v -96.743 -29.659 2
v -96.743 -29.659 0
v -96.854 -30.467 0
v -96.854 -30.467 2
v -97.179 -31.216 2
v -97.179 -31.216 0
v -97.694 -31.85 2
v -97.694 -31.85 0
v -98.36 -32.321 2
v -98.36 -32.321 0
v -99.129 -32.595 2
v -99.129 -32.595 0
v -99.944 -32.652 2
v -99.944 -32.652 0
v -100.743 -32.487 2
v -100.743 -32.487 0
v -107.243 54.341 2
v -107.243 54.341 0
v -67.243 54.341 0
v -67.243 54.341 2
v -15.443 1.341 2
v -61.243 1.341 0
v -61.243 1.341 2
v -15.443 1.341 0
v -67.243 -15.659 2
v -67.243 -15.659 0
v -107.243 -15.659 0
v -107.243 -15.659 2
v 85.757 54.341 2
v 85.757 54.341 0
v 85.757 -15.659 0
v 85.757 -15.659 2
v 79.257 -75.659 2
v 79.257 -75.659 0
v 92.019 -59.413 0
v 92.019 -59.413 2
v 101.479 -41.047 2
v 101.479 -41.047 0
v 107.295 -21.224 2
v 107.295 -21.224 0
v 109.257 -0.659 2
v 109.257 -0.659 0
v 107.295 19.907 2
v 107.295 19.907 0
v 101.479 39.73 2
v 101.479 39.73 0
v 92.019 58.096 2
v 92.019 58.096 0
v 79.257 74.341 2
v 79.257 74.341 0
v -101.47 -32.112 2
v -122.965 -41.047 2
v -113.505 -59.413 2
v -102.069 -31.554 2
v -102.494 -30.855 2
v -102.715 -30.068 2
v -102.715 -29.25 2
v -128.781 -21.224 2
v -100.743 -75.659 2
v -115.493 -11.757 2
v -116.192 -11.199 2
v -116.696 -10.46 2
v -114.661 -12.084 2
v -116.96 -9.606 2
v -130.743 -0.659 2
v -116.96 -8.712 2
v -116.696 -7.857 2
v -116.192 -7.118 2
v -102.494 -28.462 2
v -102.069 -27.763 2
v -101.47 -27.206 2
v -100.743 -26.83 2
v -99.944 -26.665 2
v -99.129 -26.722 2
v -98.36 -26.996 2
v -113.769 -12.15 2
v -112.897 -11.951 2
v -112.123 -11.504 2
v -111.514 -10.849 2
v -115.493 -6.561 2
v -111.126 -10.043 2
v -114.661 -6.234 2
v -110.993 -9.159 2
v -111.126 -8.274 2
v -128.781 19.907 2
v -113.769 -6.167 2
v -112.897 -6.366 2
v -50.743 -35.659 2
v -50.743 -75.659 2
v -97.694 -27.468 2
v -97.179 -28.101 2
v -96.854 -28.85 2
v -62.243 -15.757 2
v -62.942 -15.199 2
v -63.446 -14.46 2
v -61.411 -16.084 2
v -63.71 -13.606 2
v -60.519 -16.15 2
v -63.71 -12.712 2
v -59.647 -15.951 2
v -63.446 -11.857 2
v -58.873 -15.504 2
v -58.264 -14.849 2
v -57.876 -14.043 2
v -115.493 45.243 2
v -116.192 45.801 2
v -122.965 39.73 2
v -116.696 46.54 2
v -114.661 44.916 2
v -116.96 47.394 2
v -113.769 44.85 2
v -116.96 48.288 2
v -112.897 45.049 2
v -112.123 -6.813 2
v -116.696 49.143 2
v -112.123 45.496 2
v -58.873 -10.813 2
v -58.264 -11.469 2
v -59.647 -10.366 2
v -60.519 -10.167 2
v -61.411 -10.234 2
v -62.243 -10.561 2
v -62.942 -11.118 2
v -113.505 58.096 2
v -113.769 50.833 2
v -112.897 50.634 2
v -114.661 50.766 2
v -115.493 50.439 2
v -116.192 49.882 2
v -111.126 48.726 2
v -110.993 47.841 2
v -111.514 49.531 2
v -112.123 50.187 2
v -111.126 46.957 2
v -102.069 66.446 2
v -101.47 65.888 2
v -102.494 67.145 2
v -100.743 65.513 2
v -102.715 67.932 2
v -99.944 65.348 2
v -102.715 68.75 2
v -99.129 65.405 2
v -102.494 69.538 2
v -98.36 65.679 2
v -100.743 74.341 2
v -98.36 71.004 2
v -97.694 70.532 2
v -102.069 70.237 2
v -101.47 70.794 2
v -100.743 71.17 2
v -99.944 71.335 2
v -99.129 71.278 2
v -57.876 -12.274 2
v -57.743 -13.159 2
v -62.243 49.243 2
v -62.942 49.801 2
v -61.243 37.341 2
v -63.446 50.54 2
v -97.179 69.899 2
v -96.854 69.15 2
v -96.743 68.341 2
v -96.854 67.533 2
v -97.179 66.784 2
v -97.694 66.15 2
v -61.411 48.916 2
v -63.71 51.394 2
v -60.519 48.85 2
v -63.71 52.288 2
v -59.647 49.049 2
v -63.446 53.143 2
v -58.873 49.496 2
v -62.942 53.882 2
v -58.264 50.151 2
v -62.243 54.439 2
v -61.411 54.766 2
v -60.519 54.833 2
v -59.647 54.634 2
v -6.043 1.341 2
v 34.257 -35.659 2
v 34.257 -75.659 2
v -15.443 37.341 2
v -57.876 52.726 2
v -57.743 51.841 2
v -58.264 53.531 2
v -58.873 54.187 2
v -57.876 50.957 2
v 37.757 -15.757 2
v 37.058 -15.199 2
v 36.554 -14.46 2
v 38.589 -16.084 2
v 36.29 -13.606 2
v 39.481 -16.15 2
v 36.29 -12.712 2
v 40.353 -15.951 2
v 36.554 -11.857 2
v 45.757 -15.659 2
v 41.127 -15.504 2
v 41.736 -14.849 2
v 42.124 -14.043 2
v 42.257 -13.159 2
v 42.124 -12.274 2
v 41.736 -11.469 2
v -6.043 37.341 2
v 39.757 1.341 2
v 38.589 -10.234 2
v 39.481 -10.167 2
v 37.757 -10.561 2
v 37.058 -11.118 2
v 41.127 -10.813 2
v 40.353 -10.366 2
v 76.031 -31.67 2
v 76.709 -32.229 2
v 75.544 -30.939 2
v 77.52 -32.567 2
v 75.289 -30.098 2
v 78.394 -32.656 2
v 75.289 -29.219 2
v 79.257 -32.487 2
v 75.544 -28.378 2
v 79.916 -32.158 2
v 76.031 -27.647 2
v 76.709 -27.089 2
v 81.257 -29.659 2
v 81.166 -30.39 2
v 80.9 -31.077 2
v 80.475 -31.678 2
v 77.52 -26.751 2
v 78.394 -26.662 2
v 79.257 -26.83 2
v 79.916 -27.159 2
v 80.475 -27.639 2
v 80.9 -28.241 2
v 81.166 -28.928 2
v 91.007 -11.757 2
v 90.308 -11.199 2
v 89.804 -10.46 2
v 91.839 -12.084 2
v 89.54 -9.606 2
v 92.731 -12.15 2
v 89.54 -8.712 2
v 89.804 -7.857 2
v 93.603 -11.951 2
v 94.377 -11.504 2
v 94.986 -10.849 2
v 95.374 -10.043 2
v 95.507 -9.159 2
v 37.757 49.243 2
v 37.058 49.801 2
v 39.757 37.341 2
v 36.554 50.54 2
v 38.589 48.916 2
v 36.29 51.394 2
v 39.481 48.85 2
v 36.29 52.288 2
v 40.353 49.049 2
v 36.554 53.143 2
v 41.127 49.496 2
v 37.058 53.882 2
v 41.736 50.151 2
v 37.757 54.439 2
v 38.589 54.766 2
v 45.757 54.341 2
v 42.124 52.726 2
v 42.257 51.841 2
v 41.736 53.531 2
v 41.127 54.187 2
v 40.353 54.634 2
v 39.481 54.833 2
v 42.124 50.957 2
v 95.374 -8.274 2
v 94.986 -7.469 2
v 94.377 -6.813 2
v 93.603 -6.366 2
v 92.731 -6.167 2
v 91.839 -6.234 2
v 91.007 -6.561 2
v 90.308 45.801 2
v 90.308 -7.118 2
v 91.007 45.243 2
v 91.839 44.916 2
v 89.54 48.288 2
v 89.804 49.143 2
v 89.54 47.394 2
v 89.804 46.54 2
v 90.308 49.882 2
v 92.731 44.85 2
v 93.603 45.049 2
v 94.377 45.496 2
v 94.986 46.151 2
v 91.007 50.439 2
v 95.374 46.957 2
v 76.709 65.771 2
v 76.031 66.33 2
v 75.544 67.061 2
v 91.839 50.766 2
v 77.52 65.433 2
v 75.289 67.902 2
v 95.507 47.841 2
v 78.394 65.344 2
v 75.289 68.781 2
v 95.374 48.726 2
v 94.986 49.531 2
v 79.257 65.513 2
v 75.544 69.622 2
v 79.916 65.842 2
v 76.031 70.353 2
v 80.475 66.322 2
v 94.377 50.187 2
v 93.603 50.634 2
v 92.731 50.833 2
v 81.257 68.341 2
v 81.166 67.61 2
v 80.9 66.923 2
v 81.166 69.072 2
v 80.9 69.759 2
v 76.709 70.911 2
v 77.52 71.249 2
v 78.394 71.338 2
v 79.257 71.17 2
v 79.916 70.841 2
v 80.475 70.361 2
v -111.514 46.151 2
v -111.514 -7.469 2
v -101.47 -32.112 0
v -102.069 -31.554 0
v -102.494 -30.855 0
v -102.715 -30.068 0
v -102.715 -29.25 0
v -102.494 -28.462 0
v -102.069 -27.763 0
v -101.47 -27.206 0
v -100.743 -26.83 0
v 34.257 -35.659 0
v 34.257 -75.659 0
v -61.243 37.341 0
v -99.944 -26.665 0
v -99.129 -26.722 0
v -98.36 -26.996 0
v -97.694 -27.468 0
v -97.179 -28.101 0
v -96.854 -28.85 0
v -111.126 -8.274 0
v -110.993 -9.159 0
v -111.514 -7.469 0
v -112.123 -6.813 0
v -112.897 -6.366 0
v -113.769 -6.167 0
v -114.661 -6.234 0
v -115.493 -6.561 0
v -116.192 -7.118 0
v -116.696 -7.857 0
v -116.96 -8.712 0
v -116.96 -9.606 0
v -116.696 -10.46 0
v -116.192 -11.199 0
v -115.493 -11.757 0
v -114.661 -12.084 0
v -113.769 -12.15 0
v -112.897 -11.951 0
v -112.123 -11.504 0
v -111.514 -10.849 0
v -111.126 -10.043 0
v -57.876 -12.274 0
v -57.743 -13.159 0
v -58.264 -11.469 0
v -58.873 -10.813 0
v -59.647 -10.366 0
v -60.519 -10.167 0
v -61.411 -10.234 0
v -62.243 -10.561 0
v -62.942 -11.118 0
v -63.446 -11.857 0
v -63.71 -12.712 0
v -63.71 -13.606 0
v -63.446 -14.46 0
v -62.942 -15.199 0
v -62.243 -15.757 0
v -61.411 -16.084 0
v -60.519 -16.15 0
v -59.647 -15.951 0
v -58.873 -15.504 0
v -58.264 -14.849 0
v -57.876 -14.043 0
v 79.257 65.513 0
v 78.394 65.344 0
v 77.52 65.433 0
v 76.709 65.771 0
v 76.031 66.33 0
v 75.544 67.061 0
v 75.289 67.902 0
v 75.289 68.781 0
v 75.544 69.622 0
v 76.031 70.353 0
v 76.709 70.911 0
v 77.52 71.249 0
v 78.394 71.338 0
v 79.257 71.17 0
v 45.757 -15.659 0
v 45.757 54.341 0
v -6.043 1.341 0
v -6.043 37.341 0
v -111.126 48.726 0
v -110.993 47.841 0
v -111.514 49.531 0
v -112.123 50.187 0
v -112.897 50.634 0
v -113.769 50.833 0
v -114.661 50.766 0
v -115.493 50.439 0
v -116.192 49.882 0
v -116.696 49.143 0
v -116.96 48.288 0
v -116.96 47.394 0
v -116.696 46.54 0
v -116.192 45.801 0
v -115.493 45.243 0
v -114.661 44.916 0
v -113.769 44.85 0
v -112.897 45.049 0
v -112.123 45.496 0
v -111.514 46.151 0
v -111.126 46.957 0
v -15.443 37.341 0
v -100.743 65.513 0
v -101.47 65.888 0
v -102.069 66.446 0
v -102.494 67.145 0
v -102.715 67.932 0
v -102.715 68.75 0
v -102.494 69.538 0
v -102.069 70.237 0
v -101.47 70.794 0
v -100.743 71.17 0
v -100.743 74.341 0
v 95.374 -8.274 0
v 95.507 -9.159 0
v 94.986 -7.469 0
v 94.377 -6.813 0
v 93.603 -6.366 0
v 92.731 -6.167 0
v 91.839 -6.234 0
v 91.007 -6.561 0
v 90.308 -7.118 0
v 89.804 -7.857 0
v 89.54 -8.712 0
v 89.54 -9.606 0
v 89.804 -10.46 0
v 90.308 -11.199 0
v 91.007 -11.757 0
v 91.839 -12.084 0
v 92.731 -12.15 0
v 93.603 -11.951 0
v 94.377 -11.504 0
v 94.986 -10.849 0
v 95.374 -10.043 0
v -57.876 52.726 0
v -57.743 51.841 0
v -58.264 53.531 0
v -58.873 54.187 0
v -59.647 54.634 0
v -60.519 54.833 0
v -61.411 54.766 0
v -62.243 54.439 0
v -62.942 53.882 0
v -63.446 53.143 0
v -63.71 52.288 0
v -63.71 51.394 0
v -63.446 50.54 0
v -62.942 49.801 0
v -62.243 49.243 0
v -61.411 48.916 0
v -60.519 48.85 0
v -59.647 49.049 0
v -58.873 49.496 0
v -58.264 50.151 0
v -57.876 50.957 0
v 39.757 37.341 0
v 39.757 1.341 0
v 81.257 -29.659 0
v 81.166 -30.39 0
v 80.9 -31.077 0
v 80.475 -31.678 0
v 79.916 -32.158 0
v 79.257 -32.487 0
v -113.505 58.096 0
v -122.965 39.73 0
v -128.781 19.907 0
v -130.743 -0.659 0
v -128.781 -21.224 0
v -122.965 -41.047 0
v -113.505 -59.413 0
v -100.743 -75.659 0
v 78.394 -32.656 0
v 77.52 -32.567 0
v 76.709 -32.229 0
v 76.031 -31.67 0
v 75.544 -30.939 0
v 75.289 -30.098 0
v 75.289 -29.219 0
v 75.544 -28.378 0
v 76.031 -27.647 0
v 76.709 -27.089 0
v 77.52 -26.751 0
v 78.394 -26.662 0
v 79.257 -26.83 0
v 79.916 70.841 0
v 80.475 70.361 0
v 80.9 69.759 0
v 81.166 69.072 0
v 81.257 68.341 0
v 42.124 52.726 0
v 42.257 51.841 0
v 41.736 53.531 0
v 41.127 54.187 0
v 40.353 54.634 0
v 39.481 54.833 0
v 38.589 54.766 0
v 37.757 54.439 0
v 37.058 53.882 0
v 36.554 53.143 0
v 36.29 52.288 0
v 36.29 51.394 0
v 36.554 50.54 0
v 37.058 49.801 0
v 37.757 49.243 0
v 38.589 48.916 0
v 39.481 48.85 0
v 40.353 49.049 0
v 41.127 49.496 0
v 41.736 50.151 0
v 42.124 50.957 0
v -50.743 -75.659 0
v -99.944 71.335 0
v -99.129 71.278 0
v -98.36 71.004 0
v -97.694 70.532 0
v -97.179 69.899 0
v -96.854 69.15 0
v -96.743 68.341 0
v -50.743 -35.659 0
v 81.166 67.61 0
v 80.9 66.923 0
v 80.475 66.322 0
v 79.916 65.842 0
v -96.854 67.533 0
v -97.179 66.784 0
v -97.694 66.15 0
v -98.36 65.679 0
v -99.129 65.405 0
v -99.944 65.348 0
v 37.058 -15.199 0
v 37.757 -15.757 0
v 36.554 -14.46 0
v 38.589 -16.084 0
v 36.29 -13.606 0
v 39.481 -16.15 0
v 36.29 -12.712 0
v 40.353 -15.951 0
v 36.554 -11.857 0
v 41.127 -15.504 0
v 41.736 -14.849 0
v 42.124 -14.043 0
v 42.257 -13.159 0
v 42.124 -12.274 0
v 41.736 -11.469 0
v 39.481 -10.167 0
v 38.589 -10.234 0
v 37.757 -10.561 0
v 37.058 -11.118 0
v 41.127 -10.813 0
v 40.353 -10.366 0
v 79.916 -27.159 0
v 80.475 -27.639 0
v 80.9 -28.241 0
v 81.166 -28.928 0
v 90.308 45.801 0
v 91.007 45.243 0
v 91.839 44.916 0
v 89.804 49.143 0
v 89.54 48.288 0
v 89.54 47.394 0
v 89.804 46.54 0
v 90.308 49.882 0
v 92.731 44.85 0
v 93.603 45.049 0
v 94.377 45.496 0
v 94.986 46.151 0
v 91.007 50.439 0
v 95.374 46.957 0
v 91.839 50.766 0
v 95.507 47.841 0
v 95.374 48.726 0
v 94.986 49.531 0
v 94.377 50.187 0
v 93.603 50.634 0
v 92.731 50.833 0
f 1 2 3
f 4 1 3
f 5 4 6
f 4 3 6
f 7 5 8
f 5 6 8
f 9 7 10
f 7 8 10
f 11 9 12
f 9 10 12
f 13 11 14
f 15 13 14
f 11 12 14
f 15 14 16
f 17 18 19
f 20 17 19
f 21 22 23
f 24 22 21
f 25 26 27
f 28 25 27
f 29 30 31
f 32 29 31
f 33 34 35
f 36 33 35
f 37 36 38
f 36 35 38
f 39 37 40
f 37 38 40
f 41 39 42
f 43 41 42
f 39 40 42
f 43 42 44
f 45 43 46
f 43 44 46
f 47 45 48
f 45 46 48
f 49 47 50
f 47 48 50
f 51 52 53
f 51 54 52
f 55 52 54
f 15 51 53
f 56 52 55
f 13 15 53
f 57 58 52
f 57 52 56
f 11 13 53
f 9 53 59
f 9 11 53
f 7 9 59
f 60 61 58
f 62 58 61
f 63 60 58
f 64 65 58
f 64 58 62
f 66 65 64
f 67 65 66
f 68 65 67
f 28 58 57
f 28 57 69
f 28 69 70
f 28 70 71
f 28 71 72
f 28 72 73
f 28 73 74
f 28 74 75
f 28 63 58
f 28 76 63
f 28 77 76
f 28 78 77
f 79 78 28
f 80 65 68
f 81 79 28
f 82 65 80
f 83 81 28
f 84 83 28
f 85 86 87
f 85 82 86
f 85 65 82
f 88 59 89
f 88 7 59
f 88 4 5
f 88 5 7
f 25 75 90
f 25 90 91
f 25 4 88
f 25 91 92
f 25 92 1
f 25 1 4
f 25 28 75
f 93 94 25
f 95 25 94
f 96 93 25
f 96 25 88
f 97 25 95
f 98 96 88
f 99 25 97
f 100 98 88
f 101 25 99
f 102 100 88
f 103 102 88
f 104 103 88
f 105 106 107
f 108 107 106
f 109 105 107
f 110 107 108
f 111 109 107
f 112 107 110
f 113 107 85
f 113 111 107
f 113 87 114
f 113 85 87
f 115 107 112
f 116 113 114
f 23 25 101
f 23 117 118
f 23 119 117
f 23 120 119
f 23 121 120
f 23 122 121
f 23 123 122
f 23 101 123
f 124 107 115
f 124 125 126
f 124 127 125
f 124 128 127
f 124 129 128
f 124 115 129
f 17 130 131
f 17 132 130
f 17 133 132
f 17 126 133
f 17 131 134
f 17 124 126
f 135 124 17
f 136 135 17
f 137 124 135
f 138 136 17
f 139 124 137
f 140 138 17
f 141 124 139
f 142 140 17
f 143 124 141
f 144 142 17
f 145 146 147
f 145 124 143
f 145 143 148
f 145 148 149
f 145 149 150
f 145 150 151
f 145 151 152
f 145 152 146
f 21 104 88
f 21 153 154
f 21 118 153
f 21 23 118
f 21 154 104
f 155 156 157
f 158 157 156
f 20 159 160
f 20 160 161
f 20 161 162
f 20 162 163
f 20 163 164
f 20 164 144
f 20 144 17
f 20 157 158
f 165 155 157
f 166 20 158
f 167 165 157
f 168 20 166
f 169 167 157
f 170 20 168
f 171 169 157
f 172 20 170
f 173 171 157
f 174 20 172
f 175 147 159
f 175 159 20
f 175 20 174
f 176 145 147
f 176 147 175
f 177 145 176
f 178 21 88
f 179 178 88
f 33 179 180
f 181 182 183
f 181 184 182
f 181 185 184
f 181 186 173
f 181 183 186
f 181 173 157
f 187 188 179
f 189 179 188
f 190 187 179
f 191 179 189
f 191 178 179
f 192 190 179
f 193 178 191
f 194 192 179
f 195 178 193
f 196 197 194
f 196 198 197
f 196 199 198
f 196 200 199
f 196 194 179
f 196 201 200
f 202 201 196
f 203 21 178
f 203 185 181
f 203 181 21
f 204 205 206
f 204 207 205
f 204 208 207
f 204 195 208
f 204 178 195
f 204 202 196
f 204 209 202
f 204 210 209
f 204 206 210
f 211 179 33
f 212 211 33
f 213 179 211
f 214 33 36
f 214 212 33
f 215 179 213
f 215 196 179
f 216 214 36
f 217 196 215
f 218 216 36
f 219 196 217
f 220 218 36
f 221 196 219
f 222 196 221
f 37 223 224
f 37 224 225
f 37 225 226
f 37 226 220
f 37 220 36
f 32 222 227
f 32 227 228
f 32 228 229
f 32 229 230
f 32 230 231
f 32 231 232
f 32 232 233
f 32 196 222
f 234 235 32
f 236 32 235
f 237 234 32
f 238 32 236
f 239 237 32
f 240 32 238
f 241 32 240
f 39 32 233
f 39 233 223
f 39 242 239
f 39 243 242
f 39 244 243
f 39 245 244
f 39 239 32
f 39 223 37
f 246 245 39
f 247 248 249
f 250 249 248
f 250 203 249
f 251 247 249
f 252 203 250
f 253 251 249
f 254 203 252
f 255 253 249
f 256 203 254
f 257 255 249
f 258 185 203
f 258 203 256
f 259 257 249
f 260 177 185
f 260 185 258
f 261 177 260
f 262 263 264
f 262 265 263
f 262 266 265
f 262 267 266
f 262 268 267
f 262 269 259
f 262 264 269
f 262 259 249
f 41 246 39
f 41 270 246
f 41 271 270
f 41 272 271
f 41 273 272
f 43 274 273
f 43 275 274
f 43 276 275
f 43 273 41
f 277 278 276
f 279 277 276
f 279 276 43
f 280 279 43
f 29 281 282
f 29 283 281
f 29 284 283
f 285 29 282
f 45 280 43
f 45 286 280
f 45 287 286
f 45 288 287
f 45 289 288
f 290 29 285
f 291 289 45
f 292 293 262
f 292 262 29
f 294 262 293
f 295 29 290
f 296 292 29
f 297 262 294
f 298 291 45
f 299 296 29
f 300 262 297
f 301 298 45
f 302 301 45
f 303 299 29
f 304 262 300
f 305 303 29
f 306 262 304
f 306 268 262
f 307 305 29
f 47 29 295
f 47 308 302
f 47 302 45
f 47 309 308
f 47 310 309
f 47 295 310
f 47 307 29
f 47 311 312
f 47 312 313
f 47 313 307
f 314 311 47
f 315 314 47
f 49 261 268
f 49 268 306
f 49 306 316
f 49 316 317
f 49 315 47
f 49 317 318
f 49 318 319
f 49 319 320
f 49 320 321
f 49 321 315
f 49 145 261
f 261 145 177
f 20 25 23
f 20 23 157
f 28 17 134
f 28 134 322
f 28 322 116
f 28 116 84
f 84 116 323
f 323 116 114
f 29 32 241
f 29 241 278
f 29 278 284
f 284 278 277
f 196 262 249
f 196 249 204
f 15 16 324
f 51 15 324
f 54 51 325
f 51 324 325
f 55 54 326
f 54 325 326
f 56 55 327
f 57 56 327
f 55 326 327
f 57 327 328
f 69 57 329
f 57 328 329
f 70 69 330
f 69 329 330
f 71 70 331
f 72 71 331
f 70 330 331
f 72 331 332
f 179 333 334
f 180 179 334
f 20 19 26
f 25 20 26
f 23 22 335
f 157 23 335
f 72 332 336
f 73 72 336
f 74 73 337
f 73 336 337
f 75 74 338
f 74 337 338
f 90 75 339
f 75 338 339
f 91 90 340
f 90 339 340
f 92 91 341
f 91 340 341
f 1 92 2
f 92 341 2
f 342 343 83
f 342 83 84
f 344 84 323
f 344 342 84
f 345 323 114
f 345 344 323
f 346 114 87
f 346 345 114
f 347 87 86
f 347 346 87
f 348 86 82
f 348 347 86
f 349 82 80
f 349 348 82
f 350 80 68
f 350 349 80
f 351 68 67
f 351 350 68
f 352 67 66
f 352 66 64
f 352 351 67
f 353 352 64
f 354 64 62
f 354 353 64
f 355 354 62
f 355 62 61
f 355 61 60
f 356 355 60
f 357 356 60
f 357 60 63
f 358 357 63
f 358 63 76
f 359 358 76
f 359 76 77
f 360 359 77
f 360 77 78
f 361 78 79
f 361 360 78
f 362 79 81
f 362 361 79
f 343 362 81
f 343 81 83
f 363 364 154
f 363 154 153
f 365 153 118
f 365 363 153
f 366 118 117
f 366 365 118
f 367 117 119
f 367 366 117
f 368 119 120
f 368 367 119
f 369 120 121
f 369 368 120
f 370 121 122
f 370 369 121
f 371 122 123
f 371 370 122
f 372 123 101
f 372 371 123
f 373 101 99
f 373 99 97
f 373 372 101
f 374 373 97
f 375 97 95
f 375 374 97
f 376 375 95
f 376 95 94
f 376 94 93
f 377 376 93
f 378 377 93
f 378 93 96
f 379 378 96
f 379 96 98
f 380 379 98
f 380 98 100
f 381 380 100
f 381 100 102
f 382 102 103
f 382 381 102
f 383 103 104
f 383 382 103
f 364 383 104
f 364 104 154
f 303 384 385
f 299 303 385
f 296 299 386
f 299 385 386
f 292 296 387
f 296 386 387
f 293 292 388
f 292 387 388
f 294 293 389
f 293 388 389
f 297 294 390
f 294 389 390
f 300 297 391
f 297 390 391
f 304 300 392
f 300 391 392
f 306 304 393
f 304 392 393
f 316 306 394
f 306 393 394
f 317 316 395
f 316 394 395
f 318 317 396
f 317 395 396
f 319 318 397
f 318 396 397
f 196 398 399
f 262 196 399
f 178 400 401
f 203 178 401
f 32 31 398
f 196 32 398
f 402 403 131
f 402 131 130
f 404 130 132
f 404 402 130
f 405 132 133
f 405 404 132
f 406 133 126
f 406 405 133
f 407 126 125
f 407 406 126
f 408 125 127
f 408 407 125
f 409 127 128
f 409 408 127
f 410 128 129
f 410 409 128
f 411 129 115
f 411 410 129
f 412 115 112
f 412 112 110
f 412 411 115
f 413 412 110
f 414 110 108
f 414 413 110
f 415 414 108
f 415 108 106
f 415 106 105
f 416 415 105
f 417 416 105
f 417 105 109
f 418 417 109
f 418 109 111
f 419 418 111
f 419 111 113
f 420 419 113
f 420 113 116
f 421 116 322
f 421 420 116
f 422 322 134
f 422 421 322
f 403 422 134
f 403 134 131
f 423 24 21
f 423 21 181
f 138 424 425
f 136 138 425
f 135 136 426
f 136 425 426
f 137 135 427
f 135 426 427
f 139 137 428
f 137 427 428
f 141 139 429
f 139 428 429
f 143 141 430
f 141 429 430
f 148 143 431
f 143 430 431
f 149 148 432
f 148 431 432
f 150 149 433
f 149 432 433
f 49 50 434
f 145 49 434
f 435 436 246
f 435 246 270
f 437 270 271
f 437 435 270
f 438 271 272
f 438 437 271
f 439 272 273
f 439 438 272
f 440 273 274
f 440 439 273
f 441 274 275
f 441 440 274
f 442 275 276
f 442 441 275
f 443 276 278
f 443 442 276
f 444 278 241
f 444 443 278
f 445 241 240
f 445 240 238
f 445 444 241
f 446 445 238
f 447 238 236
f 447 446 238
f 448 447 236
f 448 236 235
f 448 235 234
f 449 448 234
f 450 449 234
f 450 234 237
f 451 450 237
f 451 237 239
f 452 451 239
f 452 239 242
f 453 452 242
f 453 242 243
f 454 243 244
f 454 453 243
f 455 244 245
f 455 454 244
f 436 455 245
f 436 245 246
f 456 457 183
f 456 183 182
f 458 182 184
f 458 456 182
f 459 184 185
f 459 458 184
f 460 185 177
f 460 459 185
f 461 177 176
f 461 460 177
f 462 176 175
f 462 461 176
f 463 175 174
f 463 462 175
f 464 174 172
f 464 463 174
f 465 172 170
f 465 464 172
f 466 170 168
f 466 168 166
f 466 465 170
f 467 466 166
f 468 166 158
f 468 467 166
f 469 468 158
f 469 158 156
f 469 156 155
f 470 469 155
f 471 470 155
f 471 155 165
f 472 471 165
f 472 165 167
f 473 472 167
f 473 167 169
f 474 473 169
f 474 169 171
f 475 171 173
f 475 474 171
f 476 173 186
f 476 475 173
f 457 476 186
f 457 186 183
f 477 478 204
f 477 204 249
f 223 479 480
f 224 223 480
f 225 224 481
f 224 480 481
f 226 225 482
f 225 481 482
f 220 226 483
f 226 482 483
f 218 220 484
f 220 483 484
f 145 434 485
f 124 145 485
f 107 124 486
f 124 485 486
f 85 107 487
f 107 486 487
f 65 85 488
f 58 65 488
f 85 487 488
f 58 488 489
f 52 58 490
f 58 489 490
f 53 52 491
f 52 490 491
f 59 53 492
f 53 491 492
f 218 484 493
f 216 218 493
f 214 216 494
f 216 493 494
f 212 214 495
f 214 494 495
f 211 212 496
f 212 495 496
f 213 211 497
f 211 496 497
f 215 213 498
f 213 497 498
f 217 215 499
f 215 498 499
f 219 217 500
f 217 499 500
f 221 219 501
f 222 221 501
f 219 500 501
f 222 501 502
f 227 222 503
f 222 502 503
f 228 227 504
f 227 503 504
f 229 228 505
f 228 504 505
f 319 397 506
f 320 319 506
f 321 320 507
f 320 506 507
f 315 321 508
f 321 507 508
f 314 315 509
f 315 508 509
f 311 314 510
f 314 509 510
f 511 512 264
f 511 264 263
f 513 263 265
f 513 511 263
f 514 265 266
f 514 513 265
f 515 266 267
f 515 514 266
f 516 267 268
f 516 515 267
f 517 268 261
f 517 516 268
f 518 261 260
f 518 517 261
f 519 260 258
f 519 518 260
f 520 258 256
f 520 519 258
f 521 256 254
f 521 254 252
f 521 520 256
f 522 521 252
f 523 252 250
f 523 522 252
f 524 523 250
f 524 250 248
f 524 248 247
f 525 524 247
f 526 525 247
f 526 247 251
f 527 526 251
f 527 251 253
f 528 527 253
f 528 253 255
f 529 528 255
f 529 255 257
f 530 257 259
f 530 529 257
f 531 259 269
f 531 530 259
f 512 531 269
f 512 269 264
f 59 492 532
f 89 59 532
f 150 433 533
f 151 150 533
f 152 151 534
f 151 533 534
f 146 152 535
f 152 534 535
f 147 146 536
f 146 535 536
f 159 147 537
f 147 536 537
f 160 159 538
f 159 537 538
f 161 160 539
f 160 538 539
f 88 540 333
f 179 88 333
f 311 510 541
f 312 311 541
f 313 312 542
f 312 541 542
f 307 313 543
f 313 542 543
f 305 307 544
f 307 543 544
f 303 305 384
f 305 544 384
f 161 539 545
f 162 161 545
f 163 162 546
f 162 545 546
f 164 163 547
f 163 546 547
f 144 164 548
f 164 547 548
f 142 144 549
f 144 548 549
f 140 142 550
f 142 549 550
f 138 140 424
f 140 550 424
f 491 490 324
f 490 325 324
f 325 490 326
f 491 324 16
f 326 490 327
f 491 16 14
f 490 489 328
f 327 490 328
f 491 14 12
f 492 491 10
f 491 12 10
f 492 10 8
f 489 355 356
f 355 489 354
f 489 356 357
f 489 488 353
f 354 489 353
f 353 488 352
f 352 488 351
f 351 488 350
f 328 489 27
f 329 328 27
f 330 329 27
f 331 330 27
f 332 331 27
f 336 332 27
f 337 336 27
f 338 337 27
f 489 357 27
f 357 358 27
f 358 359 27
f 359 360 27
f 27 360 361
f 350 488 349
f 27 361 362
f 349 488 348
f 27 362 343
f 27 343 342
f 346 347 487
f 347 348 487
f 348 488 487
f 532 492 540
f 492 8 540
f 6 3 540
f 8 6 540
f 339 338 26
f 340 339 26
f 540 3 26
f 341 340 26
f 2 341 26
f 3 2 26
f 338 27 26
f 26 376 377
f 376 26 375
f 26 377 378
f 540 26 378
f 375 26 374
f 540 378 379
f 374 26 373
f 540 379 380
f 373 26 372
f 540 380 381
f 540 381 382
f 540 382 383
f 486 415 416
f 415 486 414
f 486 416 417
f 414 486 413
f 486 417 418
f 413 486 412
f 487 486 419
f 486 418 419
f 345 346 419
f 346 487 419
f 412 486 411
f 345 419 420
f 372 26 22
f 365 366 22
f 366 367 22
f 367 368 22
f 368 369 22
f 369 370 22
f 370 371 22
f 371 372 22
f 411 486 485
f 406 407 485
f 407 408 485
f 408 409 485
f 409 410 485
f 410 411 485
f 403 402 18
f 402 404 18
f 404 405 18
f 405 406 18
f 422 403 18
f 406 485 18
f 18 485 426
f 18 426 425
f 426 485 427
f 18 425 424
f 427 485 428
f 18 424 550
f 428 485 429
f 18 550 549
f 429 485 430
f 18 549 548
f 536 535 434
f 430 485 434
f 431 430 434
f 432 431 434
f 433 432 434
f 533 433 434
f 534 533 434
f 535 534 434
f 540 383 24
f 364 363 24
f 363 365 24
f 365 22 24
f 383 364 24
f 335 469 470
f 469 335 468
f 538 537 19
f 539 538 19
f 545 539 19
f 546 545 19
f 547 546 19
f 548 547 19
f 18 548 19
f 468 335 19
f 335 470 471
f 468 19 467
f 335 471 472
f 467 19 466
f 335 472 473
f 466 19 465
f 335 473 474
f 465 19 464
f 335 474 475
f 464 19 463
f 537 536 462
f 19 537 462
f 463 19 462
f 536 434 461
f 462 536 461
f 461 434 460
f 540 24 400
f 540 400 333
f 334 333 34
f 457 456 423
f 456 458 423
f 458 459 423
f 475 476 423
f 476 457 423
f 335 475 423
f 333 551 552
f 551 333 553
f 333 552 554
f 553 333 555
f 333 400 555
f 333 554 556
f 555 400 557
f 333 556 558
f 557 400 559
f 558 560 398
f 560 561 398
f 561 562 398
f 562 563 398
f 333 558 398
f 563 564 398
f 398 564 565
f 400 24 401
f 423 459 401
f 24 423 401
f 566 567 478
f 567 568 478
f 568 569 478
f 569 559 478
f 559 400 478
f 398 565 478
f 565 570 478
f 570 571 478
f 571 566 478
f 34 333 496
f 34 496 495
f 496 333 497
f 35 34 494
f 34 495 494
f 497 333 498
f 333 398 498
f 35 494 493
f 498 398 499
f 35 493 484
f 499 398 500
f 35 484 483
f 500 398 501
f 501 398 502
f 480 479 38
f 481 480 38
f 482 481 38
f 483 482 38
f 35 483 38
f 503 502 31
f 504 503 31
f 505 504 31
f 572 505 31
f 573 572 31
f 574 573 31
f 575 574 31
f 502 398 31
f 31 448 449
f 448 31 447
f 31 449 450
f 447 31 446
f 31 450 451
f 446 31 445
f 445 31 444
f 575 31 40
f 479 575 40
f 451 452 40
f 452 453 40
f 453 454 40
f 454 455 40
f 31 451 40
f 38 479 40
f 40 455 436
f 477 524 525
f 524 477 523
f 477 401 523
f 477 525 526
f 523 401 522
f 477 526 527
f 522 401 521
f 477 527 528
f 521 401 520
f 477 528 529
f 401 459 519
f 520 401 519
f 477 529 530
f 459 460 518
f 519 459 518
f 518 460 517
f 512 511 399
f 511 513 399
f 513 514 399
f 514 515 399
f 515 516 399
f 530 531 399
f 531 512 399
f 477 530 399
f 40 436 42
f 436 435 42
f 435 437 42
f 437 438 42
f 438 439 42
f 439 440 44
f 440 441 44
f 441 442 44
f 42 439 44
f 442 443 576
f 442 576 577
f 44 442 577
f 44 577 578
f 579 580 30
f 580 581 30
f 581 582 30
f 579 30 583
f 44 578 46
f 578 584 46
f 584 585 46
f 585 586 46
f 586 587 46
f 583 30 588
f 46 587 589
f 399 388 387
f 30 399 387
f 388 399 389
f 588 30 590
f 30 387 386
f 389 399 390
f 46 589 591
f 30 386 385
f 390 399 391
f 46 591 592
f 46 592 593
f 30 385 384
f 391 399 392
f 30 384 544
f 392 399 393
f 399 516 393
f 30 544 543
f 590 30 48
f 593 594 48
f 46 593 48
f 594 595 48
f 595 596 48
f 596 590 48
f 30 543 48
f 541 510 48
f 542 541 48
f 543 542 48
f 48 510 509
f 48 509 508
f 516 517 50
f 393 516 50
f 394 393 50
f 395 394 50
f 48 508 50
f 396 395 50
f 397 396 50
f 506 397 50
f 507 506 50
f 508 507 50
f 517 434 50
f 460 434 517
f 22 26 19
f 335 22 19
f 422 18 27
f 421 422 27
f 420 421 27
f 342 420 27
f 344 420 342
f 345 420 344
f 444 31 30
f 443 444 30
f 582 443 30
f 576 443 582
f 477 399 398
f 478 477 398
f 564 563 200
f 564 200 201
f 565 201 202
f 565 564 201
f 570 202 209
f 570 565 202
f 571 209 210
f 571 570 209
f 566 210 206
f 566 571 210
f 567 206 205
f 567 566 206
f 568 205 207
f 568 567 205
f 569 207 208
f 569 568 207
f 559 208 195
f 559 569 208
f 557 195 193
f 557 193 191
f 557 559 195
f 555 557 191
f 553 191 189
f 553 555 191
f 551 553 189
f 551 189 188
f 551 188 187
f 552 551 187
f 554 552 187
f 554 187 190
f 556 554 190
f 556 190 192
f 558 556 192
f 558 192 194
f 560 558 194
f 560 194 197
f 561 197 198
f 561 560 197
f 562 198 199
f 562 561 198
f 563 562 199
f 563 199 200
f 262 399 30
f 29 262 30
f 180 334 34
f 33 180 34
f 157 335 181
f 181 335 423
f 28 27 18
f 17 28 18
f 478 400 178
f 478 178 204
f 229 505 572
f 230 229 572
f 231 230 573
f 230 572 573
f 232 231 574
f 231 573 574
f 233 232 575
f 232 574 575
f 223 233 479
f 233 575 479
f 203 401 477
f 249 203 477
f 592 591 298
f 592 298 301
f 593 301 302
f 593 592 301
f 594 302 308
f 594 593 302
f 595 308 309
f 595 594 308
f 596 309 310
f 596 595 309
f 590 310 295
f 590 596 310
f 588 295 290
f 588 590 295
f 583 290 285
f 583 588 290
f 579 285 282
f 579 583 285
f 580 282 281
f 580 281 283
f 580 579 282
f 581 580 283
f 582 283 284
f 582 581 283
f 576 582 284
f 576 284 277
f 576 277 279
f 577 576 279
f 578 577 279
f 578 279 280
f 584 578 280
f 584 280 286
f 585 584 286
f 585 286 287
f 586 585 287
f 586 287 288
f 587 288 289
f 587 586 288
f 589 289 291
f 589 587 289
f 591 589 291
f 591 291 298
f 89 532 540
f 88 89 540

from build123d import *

# Parameters (mm, degrees)
F0_R     = 3
F0_W     = 45.8
F0_H     = 36
F1_DEPTH = 2


with BuildPart() as f1:
    # F0 (on Top) → F1 (new body)
    with BuildSketch(Plane.XY):
        with BuildLine():
            Line((-100.743165, 71.169704), (-100.743165, 74.341277))
            ThreePointArc((-100.743165, 74.341277), (-130.743165, -0.658723), (-100.743165, -75.658723))
            Line((-100.743165, -75.658723), (-100.743165, -32.48715))
            ThreePointArc((-100.743165, -32.48715), (-102.743165, -29.658723), (-100.743165, -26.830296))
            Line((-100.743165, -26.830296), (-100.743165, -15.658723))
            Line((-100.743165, -15.658723), (-107.243165, -15.658723))
            Line((-107.243165, -15.658723), (-107.243165, 19.341277))
            Line((-107.243165, 19.341277), (-107.243165, 54.341277))
            Line((-107.243165, 54.341277), (-100.743165, 54.341277))
            Line((-100.743165, 54.341277), (-100.743165, 65.51285))
            ThreePointArc((-100.743165, 65.51285), (-102.743165, 68.341277), (-100.743165, 71.169704))
        make_face()
        with Locations((-113.993165, -9.158723)):
            Circle(F0_R, mode=Mode.SUBTRACT)
        with Locations((-113.993165, 47.841277)):
            Circle(F0_R, mode=Mode.SUBTRACT)
        with BuildLine():
            Line((-10.743165, 74.341277), (-100.743165, 74.341277))
            Line((-100.743165, 74.341277), (-100.743165, 71.169704))
            ThreePointArc((-100.743165, 71.169704), (-98.011114, 70.790767), (-96.743165, 68.341277))
            ThreePointArc((-96.743165, 68.341277), (-98.011114, 65.891788), (-100.743165, 65.51285))
            Line((-100.743165, 65.51285), (-100.743165, 54.341277))
            Line((-100.743165, 54.341277), (-67.243165, 54.341277))
            Line((-67.243165, 54.341277), (-67.243165, 19.341277))
            Line((-67.243165, 19.341277), (-67.243165, -15.658723))
            Line((-67.243165, -15.658723), (-100.743165, -15.658723))
            Line((-100.743165, -15.658723), (-100.743165, -26.830296))
            ThreePointArc((-100.743165, -26.830296), (-98.011114, -27.209233), (-96.743165, -29.658723))
            ThreePointArc((-96.743165, -29.658723), (-98.011114, -32.108212), (-100.743165, -32.48715))
            Line((-100.743165, -32.48715), (-100.743165, -75.658723))
            Line((-100.743165, -75.658723), (-50.743165, -75.658723))
            Line((-50.743165, -75.658723), (-50.743165, -35.658723))
            Line((-50.743165, -35.658723), (-10.743165, -35.658723))
            Line((-10.743165, -35.658723), (-10.743165, 74.341277))
        make_face()
        with Locations((-60.743165, -13.158723)):
            Circle(F0_R, mode=Mode.SUBTRACT)
        with Locations((-38.343165, 19.341277)):
            Rectangle(F0_W, F0_H, mode=Mode.SUBTRACT)
        with Locations((-60.743165, 51.841277)):
            Circle(F0_R, mode=Mode.SUBTRACT)
        with BuildLine():
            Line((79.256835, 74.341277), (-10.743165, 74.341277))
            Line((-10.743165, 74.341277), (-10.743165, -35.658723))
            Line((-10.743165, -35.658723), (34.256835, -35.658723))
            Line((34.256835, -35.658723), (34.256835, -75.658723))
            Line((34.256835, -75.658723), (79.256835, -75.658723))
            Line((79.256835, -75.658723), (79.256835, -32.48715))
            ThreePointArc((79.256835, -32.48715), (75.256835, -29.658723), (79.256835, -26.830296))
            Line((79.256835, -26.830296), (79.256835, -15.658723))
            Line((79.256835, -15.658723), (45.756835, -15.658723))
            Line((45.756835, -15.658723), (45.756835, 19.341277))
            Line((45.756835, 19.341277), (45.756835, 54.341277))
            Line((45.756835, 54.341277), (79.256835, 54.341277))
            Line((79.256835, 54.341277), (79.256835, 65.51285))
            ThreePointArc((79.256835, 65.51285), (75.256835, 68.341277), (79.256835, 71.169704))
            Line((79.256835, 71.169704), (79.256835, 74.341277))
        make_face()
        with Locations((39.256835, -13.158723)):
            Circle(F0_R, mode=Mode.SUBTRACT)
        with Locations((16.856835, 19.341277)):
            Rectangle(F0_W, F0_H, mode=Mode.SUBTRACT)
        with Locations((39.256835, 51.841277)):
            Circle(F0_R, mode=Mode.SUBTRACT)
        with BuildLine():
            ThreePointArc((79.256835, -75.658723), (109.256835, -0.658723), (79.256835, 74.341277))
            Line((79.256835, 74.341277), (79.256835, 71.169704))
            ThreePointArc((79.256835, 71.169704), (80.706325, 70.073328), (81.256835, 68.341277))
            ThreePointArc((81.256835, 68.341277), (80.706325, 66.609227), (79.256835, 65.51285))
            Line((79.256835, 65.51285), (79.256835, 54.341277))
            Line((79.256835, 54.341277), (85.756835, 54.341277))
            Line((85.756835, 54.341277), (85.756835, 19.341277))
            Line((85.756835, 19.341277), (85.756835, -15.658723))
            Line((85.756835, -15.658723), (79.256835, -15.658723))
            Line((79.256835, -15.658723), (79.256835, -26.830296))
            ThreePointArc((79.256835, -26.830296), (80.706325, -27.926672), (81.256835, -29.658723))
            ThreePointArc((81.256835, -29.658723), (80.706325, -31.390773), (79.256835, -32.48715))
            Line((79.256835, -32.48715), (79.256835, -75.658723))
        make_face()
        with Locations((92.506835, -9.158723)):
            Circle(F0_R, mode=Mode.SUBTRACT)
        with Locations((92.506835, 47.841277)):
            Circle(F0_R, mode=Mode.SUBTRACT)
    extrude(amount=F1_DEPTH)


solid = f1.part
